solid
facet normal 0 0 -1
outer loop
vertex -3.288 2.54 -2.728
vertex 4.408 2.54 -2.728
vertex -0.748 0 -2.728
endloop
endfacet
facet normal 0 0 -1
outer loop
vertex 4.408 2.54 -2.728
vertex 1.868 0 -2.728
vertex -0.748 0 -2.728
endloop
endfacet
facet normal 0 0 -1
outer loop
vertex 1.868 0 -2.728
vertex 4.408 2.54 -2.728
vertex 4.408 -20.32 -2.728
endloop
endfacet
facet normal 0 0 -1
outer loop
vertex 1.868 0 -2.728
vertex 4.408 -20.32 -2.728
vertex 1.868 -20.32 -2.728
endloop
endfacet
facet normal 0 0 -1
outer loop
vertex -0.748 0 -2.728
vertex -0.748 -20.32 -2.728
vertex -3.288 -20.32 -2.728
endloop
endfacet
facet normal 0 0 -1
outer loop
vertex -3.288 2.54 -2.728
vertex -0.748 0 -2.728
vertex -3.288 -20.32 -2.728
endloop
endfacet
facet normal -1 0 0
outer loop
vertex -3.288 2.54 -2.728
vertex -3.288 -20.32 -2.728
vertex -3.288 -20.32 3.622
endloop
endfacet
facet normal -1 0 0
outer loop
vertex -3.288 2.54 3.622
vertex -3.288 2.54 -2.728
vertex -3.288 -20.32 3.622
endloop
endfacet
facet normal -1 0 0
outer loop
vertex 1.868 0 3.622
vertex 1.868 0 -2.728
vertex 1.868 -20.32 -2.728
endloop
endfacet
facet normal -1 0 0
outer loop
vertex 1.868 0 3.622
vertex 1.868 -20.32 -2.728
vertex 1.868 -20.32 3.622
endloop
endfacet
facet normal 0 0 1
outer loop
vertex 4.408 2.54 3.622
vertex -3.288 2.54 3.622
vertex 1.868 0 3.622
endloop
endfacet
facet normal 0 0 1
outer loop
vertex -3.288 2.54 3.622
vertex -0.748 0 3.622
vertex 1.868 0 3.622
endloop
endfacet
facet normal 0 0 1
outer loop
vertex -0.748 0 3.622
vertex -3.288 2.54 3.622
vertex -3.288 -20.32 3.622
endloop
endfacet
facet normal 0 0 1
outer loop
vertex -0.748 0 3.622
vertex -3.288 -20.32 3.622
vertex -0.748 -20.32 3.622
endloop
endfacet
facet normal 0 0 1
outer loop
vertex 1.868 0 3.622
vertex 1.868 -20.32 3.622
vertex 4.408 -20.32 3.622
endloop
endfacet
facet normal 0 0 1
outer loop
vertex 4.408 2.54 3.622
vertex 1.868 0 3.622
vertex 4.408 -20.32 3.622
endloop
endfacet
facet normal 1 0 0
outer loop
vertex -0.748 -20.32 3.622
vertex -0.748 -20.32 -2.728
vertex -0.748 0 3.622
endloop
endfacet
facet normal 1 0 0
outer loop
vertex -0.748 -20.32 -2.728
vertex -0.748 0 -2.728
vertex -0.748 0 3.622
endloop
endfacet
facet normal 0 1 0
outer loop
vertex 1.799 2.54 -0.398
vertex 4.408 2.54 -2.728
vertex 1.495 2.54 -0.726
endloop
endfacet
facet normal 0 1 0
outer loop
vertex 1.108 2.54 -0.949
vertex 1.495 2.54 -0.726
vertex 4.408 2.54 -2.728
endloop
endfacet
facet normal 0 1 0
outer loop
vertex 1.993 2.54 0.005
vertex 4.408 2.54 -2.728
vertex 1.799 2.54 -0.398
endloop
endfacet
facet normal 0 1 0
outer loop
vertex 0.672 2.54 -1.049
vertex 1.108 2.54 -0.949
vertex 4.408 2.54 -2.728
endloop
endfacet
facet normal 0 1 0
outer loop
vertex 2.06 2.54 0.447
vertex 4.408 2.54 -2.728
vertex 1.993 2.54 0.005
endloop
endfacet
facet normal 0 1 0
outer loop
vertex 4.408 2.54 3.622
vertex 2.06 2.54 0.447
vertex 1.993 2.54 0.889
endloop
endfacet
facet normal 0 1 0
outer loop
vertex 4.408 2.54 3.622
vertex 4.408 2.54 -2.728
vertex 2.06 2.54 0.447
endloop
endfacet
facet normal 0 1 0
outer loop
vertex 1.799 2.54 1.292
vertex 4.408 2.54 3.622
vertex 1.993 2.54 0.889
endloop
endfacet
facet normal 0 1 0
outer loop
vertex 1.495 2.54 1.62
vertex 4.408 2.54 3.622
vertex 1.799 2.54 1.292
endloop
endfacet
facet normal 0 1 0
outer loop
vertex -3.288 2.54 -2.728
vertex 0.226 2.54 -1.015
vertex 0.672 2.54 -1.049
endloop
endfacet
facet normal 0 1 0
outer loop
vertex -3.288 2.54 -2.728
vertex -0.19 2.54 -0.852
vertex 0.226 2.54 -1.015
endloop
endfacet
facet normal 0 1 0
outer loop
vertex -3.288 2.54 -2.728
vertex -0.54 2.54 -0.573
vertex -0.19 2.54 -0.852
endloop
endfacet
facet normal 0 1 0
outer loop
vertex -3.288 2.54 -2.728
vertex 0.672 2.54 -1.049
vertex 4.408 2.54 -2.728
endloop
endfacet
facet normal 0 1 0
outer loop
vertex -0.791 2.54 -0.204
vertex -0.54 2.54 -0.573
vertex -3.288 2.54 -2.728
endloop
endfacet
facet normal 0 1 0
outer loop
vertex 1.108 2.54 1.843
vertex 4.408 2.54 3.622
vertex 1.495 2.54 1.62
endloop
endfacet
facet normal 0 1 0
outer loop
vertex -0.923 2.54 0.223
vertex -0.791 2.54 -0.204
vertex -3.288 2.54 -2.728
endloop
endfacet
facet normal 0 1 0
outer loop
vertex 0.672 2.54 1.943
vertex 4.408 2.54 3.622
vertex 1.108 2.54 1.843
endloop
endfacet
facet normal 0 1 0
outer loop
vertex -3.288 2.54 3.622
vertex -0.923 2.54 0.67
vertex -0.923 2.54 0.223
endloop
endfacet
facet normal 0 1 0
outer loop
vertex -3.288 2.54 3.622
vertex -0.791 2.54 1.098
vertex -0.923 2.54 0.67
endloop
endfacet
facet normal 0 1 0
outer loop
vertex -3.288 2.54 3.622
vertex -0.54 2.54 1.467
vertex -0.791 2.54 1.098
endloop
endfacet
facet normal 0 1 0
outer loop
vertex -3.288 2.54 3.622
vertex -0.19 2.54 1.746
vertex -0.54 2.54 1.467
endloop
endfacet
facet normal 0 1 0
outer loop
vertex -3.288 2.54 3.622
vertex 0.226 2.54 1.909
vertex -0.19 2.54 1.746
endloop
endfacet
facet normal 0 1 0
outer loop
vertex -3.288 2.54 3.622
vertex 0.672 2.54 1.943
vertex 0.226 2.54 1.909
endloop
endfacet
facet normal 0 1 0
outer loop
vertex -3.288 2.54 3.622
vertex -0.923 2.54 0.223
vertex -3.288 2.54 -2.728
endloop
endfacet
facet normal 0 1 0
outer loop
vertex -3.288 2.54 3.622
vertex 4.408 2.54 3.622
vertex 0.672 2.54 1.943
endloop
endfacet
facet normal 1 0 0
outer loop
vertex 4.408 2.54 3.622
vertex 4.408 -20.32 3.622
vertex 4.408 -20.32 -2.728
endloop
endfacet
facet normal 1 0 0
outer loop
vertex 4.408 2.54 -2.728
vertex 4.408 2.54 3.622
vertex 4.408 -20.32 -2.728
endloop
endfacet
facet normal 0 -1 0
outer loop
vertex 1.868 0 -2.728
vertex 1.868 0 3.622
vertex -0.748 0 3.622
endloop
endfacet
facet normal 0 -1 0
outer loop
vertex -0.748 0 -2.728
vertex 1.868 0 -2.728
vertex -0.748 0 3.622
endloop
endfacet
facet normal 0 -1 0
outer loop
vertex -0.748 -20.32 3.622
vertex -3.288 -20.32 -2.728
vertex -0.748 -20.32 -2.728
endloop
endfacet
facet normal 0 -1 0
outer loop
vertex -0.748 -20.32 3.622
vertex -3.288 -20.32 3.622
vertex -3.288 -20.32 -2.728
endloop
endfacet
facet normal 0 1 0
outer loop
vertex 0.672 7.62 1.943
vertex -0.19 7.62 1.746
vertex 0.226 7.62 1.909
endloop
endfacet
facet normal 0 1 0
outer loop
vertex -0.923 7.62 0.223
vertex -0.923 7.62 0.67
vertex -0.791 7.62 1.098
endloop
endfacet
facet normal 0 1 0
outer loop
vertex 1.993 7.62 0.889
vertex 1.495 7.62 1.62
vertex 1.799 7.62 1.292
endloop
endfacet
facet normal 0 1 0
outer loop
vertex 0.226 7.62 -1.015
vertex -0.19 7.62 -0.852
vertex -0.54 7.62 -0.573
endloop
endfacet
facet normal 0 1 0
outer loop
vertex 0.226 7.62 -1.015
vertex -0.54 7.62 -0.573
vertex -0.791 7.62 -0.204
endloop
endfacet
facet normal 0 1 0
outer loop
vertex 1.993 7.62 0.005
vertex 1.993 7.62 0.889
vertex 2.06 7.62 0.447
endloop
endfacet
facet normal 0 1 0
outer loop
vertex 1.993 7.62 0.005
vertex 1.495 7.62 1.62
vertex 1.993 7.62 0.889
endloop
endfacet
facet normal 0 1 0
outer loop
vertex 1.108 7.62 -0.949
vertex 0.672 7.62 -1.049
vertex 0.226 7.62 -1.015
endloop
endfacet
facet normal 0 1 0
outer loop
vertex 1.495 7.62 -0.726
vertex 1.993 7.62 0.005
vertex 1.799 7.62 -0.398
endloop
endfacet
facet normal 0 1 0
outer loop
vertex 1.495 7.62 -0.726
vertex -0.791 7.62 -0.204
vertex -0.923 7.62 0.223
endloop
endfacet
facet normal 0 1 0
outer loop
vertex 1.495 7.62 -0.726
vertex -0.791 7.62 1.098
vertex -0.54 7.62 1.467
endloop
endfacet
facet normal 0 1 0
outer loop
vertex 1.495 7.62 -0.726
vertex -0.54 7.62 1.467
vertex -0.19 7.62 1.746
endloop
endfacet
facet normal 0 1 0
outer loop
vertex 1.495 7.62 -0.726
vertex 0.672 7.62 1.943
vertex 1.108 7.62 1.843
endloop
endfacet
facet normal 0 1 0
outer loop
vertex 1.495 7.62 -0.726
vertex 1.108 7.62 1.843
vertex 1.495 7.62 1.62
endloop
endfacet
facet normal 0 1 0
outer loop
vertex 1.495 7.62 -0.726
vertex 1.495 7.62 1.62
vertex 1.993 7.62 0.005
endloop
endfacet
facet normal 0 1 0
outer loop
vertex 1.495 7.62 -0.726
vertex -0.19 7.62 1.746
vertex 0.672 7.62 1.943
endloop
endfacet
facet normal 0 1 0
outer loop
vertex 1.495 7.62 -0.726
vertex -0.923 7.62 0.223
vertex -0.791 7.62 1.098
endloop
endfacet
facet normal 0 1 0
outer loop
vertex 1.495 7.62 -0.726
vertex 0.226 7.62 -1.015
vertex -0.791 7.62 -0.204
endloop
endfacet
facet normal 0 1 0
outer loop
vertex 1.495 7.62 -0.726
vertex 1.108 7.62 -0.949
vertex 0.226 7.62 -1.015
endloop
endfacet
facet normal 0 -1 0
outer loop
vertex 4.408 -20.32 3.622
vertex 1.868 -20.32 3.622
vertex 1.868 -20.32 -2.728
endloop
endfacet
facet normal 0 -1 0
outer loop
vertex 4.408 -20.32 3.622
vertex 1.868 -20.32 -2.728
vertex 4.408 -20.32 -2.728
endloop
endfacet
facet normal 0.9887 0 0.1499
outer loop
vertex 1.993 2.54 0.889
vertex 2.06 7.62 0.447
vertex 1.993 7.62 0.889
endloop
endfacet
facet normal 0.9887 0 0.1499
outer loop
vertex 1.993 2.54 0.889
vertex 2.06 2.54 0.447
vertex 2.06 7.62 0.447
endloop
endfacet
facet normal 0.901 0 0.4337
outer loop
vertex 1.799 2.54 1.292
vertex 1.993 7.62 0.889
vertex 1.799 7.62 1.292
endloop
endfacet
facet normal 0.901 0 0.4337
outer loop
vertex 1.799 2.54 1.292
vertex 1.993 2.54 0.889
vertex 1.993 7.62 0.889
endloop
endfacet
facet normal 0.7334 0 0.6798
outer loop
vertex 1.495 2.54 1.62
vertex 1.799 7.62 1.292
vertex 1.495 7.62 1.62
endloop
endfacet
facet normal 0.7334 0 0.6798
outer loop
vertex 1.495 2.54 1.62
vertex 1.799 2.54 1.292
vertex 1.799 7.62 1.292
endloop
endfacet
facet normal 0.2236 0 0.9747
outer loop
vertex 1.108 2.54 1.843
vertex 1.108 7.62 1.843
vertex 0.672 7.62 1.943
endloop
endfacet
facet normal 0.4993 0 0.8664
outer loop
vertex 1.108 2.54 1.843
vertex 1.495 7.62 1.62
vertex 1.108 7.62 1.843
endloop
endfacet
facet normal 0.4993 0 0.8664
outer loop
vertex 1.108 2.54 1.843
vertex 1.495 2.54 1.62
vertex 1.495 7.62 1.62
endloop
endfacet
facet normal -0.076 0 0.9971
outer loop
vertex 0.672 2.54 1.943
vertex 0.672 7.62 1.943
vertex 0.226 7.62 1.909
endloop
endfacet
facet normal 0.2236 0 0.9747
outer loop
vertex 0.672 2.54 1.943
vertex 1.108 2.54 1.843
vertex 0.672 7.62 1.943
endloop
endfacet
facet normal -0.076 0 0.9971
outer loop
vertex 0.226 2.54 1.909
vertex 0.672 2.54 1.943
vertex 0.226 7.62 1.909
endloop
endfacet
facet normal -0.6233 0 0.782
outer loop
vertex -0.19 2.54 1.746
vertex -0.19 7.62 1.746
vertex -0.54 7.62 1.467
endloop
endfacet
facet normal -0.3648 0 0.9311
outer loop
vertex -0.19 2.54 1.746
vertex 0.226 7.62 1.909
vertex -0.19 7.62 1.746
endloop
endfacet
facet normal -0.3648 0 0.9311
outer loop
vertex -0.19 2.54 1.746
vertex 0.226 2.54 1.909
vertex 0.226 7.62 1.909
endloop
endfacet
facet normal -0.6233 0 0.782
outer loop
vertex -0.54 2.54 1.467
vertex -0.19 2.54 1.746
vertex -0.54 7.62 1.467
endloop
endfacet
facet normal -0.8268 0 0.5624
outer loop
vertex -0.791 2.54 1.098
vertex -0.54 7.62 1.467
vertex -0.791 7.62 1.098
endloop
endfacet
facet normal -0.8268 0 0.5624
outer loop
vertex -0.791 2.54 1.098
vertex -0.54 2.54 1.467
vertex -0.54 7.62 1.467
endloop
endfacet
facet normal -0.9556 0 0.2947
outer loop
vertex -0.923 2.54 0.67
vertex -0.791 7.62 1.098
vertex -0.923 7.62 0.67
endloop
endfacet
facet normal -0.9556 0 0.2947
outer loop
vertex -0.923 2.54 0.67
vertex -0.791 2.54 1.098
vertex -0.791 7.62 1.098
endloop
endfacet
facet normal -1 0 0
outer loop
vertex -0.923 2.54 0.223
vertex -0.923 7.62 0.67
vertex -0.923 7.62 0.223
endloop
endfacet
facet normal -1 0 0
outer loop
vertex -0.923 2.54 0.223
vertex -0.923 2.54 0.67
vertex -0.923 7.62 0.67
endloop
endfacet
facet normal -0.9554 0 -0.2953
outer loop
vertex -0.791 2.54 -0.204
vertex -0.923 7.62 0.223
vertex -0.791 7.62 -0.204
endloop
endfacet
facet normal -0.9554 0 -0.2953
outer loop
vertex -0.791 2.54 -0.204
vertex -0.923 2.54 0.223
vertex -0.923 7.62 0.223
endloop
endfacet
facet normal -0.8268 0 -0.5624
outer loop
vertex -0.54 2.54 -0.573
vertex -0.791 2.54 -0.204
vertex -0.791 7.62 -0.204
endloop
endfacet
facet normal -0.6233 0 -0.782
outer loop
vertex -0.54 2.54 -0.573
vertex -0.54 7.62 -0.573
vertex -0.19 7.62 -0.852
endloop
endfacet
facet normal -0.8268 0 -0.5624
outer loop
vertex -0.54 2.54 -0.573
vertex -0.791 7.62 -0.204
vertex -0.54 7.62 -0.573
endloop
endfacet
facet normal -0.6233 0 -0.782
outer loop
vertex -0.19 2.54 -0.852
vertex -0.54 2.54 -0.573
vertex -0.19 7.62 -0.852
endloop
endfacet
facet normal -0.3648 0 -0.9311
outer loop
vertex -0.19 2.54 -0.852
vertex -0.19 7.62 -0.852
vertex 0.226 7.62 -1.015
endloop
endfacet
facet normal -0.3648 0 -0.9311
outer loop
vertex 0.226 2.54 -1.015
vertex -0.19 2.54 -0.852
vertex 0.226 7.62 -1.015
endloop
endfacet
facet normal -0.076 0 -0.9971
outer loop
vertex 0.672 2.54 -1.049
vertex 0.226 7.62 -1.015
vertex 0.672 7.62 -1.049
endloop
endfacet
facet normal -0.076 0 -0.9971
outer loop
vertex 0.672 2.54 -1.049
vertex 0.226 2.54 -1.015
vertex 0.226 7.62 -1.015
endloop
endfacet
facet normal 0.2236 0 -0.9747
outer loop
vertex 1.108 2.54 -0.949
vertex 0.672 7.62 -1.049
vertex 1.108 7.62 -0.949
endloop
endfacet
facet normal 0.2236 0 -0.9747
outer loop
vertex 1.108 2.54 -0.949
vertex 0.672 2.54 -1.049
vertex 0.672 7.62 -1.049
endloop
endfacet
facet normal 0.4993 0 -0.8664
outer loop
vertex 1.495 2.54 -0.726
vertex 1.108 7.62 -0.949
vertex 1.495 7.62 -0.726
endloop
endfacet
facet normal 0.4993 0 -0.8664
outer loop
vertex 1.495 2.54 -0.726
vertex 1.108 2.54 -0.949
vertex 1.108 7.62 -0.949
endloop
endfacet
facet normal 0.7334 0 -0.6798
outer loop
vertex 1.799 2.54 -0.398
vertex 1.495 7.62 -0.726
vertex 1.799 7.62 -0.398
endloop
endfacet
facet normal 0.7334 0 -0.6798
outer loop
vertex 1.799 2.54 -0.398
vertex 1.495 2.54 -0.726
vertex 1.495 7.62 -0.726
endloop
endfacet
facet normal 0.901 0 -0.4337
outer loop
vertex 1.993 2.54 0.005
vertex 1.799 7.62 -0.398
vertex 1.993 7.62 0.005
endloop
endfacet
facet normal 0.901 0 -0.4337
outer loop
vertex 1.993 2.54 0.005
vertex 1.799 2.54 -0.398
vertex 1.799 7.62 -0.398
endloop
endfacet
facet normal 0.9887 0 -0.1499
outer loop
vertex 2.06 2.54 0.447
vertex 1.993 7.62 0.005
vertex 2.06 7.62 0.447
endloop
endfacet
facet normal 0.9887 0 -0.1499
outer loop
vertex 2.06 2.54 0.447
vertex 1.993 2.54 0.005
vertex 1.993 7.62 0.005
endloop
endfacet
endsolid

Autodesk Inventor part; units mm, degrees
ref_plane "YZ Plane" through (0, 0, 0) normal (1, 0, 0) x (0, 1, 0)
ref_plane "XZ Plane" through (0, 0, 0) normal (0, 1, 0) x (-1, 0, 0)
ref_plane "XY Plane" through (0, 0, 0) normal (0, 0, 1) x (1, 0, 0)
sketch "Sketch1" plane through (0, 0, 0) normal (0, 1, 0) x (-1, 0, 0)
  line L0 (3.2881, 3.6219) -> (-4.4081, 3.6219)
  line L1 (-4.4081, 3.6219) -> (-4.4081, -2.7281)
  line L2 (-4.4081, -2.7281) -> (3.2881, -2.7281)
  line L3 (3.2881, -2.7281) -> (3.2881, 3.6219)
  point P0 (0, 0)
  dimension "d0" = 7.6962
  dimension "d1" = 6.35
extrude "Extrusion1" add sketch "Sketch1" along normal blind 2.54
sketch "Sketch2" plane through (0, 2.54, 0) normal (0, 1, 0) x (1, 0, 0)
  circle A0 centre (0.56, -0.4469) radius 1.5
  line L0 (4.4081, 2.7281) -> (-3.2881, 2.7281) projected
  line L1 (-3.2881, 2.7281) -> (-3.2881, -3.6219) projected
  point P0 (0, 0)
  point P1 (0.56, 2.7281)
  point P2 (-3.2881, -0.4469)
  dimension "d4" = 3
extrude "Extrusion2" add sketch "Sketch2" along normal blind 5.08
sketch "Sketch3" plane through (0, 0, 0) normal (0, -1, 0) x (1, 0, 0)
  line L0 (-3.2881, -2.7281) -> (-3.2881, 3.6219) projected
  line L1 (-3.2881, -2.7281) -> (-0.7481, -2.7281)
  line L2 (-0.7481, -2.7281) -> (-0.7481, 3.6219)
  line L3 (-0.7481, 3.6219) -> (-3.2881, 3.6219)
  line L4 (-3.2881, 3.6219) -> (-3.2881, -2.7281)
  line L5 (4.4081, -2.7281) -> (1.8681, -2.7281)
  line L6 (1.8681, -2.7281) -> (1.8681, 3.6219)
  line L7 (1.8681, 3.6219) -> (4.4081, 3.6219)
  line L8 (4.4081, 3.6219) -> (4.4081, -2.7281)
  point P0 (0, 0)
  dimension "d7" = 2.54
  dimension "d8" = 2.54
  dimension "d9" = 2.6162
extrude "Extrusion3" add sketch "Sketch3" along normal blind 20.32
equation "\"d8\" = d7"
properties part number "Control Board Ring Slot Holder"
